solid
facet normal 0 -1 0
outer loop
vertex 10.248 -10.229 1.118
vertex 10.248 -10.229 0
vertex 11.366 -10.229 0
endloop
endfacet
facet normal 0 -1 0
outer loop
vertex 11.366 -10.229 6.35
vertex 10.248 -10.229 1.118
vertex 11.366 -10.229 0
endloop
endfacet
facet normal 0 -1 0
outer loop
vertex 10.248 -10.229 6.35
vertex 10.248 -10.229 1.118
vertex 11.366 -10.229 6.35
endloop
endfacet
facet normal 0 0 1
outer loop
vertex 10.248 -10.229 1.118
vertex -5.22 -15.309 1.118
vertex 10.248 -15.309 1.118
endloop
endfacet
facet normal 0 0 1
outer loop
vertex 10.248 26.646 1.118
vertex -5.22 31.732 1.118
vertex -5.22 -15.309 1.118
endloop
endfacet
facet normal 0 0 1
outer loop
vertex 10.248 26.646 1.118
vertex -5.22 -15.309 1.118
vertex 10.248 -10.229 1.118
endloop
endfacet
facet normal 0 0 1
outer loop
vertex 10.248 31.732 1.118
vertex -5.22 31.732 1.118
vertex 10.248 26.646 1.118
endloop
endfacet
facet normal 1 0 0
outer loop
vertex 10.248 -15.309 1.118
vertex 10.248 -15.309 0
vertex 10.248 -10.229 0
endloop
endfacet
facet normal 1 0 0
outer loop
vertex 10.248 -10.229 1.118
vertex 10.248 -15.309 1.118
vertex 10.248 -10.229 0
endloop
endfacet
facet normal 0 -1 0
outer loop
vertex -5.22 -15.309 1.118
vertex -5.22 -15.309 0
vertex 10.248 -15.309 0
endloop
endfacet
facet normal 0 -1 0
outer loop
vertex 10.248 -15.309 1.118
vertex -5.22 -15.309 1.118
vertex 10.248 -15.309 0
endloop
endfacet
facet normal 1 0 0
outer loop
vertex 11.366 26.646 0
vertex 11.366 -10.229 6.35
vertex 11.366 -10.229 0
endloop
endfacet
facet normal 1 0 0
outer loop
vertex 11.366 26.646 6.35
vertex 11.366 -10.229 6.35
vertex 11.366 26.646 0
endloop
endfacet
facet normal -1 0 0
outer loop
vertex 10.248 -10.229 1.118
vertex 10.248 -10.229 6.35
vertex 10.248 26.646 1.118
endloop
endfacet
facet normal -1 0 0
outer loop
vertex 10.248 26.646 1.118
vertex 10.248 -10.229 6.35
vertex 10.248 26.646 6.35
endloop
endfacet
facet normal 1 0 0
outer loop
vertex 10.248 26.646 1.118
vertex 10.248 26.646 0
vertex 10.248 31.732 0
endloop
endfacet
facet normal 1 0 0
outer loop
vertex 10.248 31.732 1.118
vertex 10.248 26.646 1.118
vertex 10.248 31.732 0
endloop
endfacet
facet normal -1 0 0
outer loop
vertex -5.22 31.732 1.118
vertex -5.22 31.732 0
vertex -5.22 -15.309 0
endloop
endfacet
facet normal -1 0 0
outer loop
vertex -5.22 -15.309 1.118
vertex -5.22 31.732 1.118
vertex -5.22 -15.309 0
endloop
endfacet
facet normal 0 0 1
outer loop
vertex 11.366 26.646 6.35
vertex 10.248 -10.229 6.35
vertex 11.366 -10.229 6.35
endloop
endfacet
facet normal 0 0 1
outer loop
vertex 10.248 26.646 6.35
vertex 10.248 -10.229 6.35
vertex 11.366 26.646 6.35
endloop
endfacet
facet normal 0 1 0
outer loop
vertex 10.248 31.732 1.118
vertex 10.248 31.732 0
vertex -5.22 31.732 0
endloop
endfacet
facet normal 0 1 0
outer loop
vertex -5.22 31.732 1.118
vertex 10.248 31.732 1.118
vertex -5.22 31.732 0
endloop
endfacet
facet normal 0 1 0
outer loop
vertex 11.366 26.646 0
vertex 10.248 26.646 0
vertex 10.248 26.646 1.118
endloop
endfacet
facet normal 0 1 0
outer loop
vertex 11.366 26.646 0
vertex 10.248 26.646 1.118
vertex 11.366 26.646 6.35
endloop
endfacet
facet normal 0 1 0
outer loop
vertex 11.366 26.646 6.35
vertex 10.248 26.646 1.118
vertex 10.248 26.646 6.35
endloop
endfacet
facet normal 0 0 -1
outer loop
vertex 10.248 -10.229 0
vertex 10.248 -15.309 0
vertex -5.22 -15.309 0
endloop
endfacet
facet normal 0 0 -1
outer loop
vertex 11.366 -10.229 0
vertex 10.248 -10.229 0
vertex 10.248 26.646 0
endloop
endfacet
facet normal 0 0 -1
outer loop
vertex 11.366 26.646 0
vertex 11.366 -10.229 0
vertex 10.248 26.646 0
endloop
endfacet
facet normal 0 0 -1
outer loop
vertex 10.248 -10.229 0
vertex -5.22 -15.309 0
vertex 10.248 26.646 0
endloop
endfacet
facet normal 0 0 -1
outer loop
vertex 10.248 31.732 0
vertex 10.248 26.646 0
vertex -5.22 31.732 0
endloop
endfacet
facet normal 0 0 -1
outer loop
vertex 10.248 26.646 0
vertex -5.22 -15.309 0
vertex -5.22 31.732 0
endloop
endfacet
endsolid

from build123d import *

# Parameters (mm, degrees)
F1_DEPTH = 1.1176
F2_W     = 36.874799
F2_H     = 6.35
F3_DEPTH = 1.1176


with BuildPart() as f1:
    # F0 (on Top) → F1 (new body)
    with BuildSketch(Plane.XY):
        Polygon((10.248203, 31.731885), (-5.220397, 31.731885), (-5.220397, -15.308915), (10.248203, -15.308915), (10.248203, -10.228915), (10.248203, 26.651885), align=None)
    extrude(amount=F1_DEPTH)

    # F2 (on face) → F3 (join)
    with BuildSketch(Plane.YZ.offset(10.248203)):
        with Locations((8.208485, 3.175)):
            Rectangle(F2_W, F2_H)
    extrude(amount=F3_DEPTH)


solid = f1.part
